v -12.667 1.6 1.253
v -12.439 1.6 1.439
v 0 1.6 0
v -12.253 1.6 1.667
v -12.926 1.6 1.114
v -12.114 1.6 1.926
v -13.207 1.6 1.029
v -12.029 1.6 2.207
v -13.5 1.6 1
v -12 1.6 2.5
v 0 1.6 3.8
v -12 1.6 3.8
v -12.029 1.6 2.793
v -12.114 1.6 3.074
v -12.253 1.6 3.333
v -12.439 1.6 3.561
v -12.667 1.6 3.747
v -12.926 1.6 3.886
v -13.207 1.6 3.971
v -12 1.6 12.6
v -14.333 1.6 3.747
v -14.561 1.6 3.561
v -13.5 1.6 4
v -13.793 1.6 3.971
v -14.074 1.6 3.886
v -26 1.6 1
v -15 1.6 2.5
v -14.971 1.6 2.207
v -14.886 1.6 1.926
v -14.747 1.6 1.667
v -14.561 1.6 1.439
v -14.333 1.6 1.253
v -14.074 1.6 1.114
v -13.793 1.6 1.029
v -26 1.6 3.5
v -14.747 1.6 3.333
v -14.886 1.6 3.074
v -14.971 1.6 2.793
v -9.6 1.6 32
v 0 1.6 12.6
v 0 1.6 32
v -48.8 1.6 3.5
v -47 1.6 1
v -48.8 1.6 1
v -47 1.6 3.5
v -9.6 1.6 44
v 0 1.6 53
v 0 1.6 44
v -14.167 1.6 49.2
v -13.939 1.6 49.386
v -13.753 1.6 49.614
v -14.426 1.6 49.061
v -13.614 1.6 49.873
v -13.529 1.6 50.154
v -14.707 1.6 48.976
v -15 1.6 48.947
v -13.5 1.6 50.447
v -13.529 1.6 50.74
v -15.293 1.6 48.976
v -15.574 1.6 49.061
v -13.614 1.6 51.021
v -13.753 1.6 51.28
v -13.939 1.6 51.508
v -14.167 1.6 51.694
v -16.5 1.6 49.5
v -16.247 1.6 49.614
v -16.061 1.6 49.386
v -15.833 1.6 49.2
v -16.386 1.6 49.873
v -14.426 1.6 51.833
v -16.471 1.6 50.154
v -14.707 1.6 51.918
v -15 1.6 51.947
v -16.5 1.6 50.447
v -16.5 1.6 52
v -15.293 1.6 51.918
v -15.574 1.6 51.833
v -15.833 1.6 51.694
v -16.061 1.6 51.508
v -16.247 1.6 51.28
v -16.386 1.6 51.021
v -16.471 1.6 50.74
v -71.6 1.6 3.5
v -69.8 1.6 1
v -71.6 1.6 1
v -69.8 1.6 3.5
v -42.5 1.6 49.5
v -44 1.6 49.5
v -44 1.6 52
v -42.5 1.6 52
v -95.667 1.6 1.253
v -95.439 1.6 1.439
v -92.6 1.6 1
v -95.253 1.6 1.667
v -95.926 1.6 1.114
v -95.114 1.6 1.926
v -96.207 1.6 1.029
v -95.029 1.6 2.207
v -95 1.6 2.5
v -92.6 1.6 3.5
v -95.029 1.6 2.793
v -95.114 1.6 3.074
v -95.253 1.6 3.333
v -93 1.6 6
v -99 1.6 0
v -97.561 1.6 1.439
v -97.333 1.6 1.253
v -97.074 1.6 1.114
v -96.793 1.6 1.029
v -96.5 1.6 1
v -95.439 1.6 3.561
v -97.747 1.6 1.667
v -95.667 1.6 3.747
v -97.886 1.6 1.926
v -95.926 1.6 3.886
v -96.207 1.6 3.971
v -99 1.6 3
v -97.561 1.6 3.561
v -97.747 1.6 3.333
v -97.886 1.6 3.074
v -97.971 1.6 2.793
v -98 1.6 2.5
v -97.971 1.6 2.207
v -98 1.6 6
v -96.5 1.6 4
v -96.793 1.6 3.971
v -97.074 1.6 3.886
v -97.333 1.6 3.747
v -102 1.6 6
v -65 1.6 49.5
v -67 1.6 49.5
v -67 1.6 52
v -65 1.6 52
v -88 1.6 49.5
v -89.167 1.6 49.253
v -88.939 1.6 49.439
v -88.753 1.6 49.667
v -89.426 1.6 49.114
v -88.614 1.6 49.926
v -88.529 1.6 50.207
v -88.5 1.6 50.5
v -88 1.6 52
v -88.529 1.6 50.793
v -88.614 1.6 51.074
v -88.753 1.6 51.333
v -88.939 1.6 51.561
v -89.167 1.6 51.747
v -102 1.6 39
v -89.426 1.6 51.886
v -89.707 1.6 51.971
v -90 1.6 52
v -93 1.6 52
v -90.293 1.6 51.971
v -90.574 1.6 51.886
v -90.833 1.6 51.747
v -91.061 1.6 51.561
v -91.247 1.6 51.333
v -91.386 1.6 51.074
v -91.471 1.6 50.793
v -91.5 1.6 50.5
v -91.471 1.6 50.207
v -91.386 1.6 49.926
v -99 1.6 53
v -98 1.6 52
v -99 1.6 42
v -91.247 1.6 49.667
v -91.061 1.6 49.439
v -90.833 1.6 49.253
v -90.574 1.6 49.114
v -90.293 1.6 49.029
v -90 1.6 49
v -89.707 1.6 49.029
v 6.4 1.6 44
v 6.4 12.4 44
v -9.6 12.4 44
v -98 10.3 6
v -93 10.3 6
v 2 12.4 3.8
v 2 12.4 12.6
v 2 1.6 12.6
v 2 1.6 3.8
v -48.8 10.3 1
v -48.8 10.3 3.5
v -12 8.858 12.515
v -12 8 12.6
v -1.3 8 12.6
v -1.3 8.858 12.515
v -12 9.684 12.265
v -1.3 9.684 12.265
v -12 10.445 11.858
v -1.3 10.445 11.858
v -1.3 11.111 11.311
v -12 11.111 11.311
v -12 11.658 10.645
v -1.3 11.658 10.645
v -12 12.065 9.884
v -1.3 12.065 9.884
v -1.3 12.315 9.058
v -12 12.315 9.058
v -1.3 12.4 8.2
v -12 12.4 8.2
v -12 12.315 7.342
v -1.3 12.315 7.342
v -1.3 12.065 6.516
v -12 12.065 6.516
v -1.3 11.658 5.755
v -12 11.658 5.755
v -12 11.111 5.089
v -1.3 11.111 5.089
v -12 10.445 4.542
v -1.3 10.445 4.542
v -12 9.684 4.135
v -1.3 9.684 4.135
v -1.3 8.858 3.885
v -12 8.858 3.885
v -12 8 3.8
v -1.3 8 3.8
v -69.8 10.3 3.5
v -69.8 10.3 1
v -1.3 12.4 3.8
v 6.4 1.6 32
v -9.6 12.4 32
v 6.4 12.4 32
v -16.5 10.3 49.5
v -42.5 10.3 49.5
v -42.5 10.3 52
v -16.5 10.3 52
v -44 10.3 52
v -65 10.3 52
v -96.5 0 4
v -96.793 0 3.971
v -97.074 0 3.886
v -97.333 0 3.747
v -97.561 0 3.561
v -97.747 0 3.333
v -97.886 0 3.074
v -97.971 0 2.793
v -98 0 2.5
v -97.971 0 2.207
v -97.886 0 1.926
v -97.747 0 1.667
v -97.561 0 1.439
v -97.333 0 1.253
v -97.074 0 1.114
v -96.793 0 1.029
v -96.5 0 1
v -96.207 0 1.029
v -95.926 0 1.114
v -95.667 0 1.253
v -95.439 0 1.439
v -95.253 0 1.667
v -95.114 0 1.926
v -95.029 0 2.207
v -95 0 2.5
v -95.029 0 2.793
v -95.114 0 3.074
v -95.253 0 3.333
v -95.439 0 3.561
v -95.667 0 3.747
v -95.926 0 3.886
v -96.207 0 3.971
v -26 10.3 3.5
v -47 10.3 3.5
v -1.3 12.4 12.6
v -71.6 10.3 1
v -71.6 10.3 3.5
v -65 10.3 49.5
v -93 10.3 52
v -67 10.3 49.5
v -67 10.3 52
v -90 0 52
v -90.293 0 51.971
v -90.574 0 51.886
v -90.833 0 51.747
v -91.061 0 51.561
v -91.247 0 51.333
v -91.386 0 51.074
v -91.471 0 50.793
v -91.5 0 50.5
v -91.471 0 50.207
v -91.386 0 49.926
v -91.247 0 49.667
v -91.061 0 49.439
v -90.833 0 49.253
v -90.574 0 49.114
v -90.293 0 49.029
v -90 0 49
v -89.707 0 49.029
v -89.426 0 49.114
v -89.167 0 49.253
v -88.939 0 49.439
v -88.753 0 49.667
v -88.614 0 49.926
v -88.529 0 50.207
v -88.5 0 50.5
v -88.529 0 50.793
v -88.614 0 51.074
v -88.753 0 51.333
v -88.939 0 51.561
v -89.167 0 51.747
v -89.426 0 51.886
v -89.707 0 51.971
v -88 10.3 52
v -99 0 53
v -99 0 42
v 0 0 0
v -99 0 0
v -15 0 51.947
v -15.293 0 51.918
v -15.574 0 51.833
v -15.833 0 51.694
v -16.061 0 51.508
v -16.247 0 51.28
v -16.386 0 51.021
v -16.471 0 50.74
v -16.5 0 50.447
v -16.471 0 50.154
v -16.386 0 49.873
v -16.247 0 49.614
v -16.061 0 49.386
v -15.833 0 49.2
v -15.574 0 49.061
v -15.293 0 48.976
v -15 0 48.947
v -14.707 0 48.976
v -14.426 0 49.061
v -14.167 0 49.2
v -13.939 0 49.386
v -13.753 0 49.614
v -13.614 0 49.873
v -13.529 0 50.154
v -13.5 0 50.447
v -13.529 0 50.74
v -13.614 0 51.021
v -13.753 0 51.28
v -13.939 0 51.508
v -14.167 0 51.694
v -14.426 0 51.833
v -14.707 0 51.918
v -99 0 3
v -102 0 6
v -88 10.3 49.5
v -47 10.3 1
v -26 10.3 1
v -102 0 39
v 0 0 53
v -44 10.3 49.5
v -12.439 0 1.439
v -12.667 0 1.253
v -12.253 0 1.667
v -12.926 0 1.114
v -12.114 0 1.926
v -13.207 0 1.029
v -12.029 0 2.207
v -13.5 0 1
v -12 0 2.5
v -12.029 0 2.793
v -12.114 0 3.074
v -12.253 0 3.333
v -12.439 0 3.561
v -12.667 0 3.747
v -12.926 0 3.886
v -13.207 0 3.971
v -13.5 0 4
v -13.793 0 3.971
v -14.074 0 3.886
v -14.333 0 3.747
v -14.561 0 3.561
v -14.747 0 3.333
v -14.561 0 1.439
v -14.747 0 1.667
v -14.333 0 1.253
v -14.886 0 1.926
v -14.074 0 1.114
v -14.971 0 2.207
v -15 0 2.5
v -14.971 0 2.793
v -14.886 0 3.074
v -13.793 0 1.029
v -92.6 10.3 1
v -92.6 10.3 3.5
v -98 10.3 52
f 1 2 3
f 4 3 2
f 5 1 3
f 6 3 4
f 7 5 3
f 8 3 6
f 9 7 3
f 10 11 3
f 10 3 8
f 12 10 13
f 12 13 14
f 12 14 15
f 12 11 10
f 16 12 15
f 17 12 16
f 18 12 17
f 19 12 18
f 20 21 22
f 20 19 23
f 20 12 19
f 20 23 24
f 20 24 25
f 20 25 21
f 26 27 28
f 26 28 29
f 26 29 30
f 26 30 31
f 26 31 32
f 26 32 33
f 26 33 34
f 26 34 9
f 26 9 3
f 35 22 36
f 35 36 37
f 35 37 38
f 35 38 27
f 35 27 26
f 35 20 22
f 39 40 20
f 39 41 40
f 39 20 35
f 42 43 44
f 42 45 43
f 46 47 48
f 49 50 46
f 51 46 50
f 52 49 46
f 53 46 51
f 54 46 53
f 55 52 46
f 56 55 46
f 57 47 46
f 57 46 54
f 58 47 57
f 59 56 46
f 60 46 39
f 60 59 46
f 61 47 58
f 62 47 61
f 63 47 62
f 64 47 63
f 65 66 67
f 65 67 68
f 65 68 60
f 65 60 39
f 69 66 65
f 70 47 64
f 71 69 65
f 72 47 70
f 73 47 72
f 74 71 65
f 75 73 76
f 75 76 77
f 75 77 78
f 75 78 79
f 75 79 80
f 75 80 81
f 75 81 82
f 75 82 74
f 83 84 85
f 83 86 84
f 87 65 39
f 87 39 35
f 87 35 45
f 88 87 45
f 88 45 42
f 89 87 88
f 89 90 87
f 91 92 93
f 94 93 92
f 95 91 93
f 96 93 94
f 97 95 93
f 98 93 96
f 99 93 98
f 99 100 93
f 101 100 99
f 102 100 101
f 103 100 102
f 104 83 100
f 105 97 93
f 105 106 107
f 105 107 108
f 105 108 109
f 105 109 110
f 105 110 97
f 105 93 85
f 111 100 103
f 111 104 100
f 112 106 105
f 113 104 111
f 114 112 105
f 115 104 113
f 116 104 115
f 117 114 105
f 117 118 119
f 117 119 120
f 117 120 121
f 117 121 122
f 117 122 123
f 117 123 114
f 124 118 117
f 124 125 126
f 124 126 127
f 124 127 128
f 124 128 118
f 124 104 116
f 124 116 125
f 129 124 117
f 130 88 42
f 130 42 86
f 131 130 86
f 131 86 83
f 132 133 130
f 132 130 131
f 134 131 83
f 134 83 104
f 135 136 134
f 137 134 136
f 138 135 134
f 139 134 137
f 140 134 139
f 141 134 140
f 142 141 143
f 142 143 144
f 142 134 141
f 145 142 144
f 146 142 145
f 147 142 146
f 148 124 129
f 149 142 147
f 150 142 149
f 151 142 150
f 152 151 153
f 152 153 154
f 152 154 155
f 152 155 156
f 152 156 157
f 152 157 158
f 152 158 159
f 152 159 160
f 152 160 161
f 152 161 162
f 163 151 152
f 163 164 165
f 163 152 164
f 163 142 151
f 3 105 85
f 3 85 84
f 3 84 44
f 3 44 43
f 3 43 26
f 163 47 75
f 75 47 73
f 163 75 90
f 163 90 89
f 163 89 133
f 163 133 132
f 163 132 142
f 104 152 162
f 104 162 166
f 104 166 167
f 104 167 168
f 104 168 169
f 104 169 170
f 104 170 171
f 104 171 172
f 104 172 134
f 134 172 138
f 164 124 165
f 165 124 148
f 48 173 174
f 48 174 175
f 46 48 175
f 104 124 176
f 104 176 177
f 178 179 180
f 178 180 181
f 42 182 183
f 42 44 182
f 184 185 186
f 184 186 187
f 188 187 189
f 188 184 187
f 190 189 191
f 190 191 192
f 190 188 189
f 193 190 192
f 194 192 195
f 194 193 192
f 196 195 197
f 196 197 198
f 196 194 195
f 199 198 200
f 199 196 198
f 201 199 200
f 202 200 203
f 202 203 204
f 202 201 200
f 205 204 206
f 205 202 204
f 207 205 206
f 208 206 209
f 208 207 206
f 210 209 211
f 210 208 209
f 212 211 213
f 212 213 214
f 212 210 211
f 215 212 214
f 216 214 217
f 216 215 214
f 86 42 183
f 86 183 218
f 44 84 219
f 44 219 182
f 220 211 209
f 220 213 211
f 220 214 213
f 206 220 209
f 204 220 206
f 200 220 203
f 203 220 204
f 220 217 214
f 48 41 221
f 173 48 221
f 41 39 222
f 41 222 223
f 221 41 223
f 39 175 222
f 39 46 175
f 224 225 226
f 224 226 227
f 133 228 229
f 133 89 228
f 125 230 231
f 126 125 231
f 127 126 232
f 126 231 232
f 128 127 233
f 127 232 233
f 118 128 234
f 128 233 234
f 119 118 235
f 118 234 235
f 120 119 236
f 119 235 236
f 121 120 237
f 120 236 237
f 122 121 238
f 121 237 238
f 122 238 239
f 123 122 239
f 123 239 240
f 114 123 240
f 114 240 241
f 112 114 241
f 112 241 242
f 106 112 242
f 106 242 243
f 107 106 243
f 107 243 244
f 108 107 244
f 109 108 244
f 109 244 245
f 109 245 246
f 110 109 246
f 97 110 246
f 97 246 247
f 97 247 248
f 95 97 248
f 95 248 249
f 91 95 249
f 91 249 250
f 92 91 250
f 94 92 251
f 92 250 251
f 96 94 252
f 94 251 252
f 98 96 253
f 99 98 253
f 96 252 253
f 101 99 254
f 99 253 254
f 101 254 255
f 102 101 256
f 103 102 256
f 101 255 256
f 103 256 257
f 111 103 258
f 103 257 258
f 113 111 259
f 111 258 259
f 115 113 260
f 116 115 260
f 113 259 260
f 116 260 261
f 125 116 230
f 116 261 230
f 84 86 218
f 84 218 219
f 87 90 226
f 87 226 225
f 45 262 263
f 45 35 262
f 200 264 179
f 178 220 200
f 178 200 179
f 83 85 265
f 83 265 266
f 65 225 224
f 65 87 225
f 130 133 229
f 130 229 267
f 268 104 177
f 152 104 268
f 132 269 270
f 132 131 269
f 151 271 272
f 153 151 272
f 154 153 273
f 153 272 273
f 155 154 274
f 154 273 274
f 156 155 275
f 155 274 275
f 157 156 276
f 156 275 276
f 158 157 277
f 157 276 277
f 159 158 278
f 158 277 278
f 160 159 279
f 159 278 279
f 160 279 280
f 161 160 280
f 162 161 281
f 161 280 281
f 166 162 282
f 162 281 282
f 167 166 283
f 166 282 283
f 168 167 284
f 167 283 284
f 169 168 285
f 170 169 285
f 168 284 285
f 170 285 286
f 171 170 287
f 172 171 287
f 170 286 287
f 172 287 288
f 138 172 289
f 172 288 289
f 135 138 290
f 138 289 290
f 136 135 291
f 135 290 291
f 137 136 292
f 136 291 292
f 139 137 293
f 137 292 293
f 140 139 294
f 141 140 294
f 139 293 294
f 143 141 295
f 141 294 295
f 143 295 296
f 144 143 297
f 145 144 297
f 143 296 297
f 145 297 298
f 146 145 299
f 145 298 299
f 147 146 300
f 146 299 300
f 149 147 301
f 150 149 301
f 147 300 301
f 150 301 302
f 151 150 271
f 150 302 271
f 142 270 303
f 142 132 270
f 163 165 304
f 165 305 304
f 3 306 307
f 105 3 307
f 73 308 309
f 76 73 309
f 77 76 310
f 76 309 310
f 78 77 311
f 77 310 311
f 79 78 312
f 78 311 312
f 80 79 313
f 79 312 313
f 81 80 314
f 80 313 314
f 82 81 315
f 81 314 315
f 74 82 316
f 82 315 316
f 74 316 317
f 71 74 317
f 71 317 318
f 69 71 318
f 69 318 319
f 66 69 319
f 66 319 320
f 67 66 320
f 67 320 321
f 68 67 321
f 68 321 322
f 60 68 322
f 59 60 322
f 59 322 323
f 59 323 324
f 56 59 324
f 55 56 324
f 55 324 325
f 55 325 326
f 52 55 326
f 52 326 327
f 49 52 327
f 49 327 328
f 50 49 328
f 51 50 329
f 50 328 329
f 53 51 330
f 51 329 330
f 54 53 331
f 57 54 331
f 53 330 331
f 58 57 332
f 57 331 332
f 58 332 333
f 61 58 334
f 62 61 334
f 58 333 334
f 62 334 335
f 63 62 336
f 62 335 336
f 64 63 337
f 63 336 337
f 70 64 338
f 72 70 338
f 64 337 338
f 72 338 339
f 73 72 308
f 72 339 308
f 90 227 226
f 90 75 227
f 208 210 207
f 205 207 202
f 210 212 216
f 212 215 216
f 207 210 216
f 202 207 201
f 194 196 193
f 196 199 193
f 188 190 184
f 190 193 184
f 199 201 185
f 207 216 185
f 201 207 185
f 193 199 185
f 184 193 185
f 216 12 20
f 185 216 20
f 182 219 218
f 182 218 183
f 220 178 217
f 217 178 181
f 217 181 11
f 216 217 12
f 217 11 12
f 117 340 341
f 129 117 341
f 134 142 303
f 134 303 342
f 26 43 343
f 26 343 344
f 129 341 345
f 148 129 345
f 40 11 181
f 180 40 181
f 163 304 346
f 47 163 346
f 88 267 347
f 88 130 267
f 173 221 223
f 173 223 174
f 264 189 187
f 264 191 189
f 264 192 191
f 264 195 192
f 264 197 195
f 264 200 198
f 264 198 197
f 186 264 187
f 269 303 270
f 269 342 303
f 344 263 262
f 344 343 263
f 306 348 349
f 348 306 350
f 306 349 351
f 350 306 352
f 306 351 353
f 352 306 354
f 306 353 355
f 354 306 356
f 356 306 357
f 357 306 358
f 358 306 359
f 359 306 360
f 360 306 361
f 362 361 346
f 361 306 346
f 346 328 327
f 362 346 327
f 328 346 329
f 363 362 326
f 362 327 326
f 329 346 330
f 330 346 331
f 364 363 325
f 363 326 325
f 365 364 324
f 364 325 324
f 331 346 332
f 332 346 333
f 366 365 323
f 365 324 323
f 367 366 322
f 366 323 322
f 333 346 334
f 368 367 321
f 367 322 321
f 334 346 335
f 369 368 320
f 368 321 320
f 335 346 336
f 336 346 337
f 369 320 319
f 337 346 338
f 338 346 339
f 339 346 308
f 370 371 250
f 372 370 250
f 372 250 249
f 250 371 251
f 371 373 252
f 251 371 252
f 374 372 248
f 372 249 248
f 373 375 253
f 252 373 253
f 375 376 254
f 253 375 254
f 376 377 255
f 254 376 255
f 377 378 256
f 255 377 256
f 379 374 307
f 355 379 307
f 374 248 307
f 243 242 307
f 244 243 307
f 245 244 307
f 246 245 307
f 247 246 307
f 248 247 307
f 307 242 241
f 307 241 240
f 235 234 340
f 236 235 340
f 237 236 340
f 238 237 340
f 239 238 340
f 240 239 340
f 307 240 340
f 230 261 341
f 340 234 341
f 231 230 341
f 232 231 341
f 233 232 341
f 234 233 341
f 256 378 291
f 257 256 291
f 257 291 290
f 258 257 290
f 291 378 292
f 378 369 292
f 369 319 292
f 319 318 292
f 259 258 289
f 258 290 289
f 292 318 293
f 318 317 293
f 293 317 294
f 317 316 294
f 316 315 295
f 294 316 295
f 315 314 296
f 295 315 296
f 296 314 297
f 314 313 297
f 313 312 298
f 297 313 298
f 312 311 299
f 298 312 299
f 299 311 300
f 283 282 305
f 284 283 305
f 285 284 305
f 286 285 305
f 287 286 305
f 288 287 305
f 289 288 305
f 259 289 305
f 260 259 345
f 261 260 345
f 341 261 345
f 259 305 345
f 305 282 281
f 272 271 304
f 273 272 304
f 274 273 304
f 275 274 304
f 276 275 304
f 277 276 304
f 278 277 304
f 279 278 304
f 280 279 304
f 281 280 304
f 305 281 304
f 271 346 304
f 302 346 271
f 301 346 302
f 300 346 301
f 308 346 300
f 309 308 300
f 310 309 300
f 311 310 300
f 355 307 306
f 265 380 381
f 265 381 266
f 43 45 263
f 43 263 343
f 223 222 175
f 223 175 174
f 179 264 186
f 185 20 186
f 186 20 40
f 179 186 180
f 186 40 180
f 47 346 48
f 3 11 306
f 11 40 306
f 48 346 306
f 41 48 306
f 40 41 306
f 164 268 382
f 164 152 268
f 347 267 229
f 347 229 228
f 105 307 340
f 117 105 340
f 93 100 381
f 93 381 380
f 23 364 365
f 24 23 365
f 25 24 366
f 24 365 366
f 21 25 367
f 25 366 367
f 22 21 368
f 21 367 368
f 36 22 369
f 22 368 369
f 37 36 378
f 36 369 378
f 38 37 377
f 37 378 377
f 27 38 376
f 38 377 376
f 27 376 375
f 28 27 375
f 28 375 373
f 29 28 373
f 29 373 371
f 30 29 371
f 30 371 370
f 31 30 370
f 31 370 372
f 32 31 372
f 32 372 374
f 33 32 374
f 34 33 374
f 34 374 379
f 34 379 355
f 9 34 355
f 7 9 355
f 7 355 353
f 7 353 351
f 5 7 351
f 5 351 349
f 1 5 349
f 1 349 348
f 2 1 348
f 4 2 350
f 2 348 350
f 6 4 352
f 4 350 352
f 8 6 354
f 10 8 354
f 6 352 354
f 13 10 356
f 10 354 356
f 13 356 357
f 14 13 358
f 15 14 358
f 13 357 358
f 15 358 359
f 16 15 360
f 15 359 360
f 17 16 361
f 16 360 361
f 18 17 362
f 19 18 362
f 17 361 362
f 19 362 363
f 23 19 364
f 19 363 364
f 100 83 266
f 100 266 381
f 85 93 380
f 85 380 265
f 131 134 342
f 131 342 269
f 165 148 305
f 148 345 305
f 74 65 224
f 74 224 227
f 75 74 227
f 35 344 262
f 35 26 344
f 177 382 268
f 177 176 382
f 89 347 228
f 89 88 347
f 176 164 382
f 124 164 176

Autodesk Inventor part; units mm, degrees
ref_plane "YZ Plane" through (0, 0, 0) normal (1, 0, 0) x (0, 1, 0)
ref_plane "XZ Plane" through (0, 0, 0) normal (0, 1, 0) x (-1, 0, 0)
ref_plane "XY Plane" through (0, 0, 0) normal (0, 0, 1) x (1, 0, 0)
sketch "Sketch1" plane through (0, 0, 0) normal (0, 1, 0) x (-1, 0, 0)
  line L0 (0, 0) -> (99, 0)
  line L1 (99, 0) -> (99, 3)
  line L2 (99, 3) -> (102, 6)
  line L3 (102, 6) -> (102, 39)
  line L4 (102, 39) -> (99, 42)
  line L5 (99, 42) -> (99, 53)
  line L6 (99, 53) -> (0, 53)
  line L7 (0, 53) -> (0, 0)
  dimension "d0" = 99
  dimension "d1" = 3
  dimension "d2" = 135
  dimension "d3" = 33
  dimension "d4" = 3
  dimension "d5" = 3
  dimension "d6" = 53
extrude "Extrusion1" add sketch "Sketch1" along normal blind 1.6
sketch "Sketch2" plane through (0, 1.6, 0) normal (0, 1, 0) x (1, 0, 0)
  line L0 (0, 0) -> (-99, 0) projected
  line L1 (0, -53) -> (0, 0) projected
  line L2 (2, -3.8) -> (-12, -3.8)
  line L3 (-12, -3.8) -> (-12, -12.6)
  line L4 (-12, -12.6) -> (2, -12.6)
  line L5 (2, -12.6) -> (2, -3.8)
  dimension "d9" = 8.8
  dimension "d10" = 2
  dimension "d11" = 3.8
  dimension "d12" = 14
extrude "Extrusion2" add sketch "Sketch2" along normal blind 10.8
sketch "Sketch3" plane through (-12, 1.6, 3.8) normal (-1, 0, 0) x (0, 0, 1)
  line L0 (8.8, 0) -> (0, 0) projected
  line L1 (8.8, 0) -> (8.8, 10.8) projected
  line L2 (0, 10.8) -> (8.8, 10.8) projected
  line L3 (0, 0) -> (0, 10.8) projected
  arc A0 (8.8, 6.4) -> (0, 6.4) centre (4.4, 6.4) ccw
  point P0 (-3.8, -1.6)
extrude "Extrusion3" cut sketch "Sketch3" against normal blind 10.7 contours A0 L2 L1 | L3 L2 A0
sketch "Sketch4" plane through (0, 1.6, 0) normal (0, 1, 0) x (1, 0, 0)
  line L0 (-99, -53) -> (0, -53) projected
  line L1 (0, -53) -> (0, -12.6) projected
  line L2 (-9.6, -32) -> (6.4, -32)
  line L3 (6.4, -32) -> (6.4, -44)
  line L4 (6.4, -44) -> (-9.6, -44)
  line L5 (-9.6, -44) -> (-9.6, -32)
  dimension "d17" = 16
  dimension "d18" = 12
  dimension "d19" = 6.4
  dimension "d20" = 9
extrude "Extrusion4" add sketch "Sketch4" along normal blind 10.8
sketch "Sketch5" plane through (0, 1.6, 0) normal (0, 1, 0) x (1, 0, 0)
  line L0 (0, -3.8) -> (0, 0) projected
  line L1 (0, 0) -> (-99, 0) projected
  line L2 (-26, -3.5) -> (-47, -3.5)
  line L3 (-47, -3.5) -> (-47, -1)
  line L4 (-47, -1) -> (-26, -1)
  line L5 (-26, -1) -> (-26, -3.5)
  line L6 (-48.8, -3.5) -> (-69.8, -3.5)
  line L7 (-69.8, -3.5) -> (-69.8, -1)
  line L8 (-69.8, -1) -> (-48.8, -1)
  line L9 (-48.8, -1) -> (-48.8, -3.5)
  line L10 (-71.6, -3.5) -> (-92.6, -3.5)
  line L11 (-92.6, -3.5) -> (-92.6, -1)
  line L12 (-92.6, -1) -> (-71.6, -1)
  line L13 (-71.6, -1) -> (-71.6, -3.5)
  dimension "d23" = 21
  dimension "d24" = 2.5
  dimension "d25" = 26
  dimension "d26" = 1
  dimension "d29" = 22.8
extrude "Extrusion5" add sketch "Sketch5" along normal blind 8.7
sketch "Sketch6" plane through (0, 1.6, 0) normal (0, 1, 0) x (1, 0, 0)
  line L0 (0, 0) -> (-99, 0) projected
  line L1 (-102, -6) -> (-102, -39) projected
  line L2 (-98, -6) -> (-93, -6)
  line L3 (-93, -6) -> (-93, -52)
  line L4 (-93, -52) -> (-98, -52)
  line L5 (-98, -52) -> (-98, -6)
  dimension "d36" = 46
  dimension "d37" = 5
  dimension "d38" = 4
  dimension "d39" = 6
extrude "Extrusion6" add sketch "Sketch6" along normal blind 8.7
sketch "Sketch7" plane through (0, 1.6, 0) normal (0, 1, 0) x (1, 0, 0)
  line L0 (-99, -42) -> (-99, -53) projected
  line L1 (-99, -53) -> (0, -53) projected
  line L2 (-88, -49.5) -> (-67, -49.5)
  line L3 (-67, -49.5) -> (-67, -52)
  line L4 (-67, -52) -> (-88, -52)
  line L5 (-88, -52) -> (-88, -49.5)
  line L6 (-65, -49.5) -> (-44, -49.5)
  line L7 (-44, -49.5) -> (-44, -52)
  line L8 (-44, -52) -> (-65, -52)
  line L9 (-65, -52) -> (-65, -49.5)
  line L10 (-42.5, -49.5) -> (-16.5, -49.5)
  line L11 (-16.5, -49.5) -> (-16.5, -52)
  line L12 (-16.5, -52) -> (-42.5, -52)
  line L13 (-42.5, -52) -> (-42.5, -49.5)
  dimension "d42" = 21
  dimension "d43" = 2.5
  dimension "d44" = 1
  dimension "d45" = 11
  dimension "d48" = 23
  dimension "d54" = 26
  dimension "d55" = 1
  dimension "d56" = 1.5
extrude "Extrusion7" add sketch "Sketch7" along normal blind 8.7
hole "Hole1" at (-96.5, 1.6, 2.5) direction (0, -1, 0) diameter 3 end through all
hole "Hole2" at (-90, 1.6, 50.5) direction (0, -1, 0) diameter 3 end through all
hole "Hole3" at (-13.5, 1.6, 2.5) direction (0, -1, 0) diameter 3 end through all
hole "Hole4" at (-15, 1.6, 50.447) direction (0, -1, 0) diameter 3 end through all
properties part number "ArduinoMega"
